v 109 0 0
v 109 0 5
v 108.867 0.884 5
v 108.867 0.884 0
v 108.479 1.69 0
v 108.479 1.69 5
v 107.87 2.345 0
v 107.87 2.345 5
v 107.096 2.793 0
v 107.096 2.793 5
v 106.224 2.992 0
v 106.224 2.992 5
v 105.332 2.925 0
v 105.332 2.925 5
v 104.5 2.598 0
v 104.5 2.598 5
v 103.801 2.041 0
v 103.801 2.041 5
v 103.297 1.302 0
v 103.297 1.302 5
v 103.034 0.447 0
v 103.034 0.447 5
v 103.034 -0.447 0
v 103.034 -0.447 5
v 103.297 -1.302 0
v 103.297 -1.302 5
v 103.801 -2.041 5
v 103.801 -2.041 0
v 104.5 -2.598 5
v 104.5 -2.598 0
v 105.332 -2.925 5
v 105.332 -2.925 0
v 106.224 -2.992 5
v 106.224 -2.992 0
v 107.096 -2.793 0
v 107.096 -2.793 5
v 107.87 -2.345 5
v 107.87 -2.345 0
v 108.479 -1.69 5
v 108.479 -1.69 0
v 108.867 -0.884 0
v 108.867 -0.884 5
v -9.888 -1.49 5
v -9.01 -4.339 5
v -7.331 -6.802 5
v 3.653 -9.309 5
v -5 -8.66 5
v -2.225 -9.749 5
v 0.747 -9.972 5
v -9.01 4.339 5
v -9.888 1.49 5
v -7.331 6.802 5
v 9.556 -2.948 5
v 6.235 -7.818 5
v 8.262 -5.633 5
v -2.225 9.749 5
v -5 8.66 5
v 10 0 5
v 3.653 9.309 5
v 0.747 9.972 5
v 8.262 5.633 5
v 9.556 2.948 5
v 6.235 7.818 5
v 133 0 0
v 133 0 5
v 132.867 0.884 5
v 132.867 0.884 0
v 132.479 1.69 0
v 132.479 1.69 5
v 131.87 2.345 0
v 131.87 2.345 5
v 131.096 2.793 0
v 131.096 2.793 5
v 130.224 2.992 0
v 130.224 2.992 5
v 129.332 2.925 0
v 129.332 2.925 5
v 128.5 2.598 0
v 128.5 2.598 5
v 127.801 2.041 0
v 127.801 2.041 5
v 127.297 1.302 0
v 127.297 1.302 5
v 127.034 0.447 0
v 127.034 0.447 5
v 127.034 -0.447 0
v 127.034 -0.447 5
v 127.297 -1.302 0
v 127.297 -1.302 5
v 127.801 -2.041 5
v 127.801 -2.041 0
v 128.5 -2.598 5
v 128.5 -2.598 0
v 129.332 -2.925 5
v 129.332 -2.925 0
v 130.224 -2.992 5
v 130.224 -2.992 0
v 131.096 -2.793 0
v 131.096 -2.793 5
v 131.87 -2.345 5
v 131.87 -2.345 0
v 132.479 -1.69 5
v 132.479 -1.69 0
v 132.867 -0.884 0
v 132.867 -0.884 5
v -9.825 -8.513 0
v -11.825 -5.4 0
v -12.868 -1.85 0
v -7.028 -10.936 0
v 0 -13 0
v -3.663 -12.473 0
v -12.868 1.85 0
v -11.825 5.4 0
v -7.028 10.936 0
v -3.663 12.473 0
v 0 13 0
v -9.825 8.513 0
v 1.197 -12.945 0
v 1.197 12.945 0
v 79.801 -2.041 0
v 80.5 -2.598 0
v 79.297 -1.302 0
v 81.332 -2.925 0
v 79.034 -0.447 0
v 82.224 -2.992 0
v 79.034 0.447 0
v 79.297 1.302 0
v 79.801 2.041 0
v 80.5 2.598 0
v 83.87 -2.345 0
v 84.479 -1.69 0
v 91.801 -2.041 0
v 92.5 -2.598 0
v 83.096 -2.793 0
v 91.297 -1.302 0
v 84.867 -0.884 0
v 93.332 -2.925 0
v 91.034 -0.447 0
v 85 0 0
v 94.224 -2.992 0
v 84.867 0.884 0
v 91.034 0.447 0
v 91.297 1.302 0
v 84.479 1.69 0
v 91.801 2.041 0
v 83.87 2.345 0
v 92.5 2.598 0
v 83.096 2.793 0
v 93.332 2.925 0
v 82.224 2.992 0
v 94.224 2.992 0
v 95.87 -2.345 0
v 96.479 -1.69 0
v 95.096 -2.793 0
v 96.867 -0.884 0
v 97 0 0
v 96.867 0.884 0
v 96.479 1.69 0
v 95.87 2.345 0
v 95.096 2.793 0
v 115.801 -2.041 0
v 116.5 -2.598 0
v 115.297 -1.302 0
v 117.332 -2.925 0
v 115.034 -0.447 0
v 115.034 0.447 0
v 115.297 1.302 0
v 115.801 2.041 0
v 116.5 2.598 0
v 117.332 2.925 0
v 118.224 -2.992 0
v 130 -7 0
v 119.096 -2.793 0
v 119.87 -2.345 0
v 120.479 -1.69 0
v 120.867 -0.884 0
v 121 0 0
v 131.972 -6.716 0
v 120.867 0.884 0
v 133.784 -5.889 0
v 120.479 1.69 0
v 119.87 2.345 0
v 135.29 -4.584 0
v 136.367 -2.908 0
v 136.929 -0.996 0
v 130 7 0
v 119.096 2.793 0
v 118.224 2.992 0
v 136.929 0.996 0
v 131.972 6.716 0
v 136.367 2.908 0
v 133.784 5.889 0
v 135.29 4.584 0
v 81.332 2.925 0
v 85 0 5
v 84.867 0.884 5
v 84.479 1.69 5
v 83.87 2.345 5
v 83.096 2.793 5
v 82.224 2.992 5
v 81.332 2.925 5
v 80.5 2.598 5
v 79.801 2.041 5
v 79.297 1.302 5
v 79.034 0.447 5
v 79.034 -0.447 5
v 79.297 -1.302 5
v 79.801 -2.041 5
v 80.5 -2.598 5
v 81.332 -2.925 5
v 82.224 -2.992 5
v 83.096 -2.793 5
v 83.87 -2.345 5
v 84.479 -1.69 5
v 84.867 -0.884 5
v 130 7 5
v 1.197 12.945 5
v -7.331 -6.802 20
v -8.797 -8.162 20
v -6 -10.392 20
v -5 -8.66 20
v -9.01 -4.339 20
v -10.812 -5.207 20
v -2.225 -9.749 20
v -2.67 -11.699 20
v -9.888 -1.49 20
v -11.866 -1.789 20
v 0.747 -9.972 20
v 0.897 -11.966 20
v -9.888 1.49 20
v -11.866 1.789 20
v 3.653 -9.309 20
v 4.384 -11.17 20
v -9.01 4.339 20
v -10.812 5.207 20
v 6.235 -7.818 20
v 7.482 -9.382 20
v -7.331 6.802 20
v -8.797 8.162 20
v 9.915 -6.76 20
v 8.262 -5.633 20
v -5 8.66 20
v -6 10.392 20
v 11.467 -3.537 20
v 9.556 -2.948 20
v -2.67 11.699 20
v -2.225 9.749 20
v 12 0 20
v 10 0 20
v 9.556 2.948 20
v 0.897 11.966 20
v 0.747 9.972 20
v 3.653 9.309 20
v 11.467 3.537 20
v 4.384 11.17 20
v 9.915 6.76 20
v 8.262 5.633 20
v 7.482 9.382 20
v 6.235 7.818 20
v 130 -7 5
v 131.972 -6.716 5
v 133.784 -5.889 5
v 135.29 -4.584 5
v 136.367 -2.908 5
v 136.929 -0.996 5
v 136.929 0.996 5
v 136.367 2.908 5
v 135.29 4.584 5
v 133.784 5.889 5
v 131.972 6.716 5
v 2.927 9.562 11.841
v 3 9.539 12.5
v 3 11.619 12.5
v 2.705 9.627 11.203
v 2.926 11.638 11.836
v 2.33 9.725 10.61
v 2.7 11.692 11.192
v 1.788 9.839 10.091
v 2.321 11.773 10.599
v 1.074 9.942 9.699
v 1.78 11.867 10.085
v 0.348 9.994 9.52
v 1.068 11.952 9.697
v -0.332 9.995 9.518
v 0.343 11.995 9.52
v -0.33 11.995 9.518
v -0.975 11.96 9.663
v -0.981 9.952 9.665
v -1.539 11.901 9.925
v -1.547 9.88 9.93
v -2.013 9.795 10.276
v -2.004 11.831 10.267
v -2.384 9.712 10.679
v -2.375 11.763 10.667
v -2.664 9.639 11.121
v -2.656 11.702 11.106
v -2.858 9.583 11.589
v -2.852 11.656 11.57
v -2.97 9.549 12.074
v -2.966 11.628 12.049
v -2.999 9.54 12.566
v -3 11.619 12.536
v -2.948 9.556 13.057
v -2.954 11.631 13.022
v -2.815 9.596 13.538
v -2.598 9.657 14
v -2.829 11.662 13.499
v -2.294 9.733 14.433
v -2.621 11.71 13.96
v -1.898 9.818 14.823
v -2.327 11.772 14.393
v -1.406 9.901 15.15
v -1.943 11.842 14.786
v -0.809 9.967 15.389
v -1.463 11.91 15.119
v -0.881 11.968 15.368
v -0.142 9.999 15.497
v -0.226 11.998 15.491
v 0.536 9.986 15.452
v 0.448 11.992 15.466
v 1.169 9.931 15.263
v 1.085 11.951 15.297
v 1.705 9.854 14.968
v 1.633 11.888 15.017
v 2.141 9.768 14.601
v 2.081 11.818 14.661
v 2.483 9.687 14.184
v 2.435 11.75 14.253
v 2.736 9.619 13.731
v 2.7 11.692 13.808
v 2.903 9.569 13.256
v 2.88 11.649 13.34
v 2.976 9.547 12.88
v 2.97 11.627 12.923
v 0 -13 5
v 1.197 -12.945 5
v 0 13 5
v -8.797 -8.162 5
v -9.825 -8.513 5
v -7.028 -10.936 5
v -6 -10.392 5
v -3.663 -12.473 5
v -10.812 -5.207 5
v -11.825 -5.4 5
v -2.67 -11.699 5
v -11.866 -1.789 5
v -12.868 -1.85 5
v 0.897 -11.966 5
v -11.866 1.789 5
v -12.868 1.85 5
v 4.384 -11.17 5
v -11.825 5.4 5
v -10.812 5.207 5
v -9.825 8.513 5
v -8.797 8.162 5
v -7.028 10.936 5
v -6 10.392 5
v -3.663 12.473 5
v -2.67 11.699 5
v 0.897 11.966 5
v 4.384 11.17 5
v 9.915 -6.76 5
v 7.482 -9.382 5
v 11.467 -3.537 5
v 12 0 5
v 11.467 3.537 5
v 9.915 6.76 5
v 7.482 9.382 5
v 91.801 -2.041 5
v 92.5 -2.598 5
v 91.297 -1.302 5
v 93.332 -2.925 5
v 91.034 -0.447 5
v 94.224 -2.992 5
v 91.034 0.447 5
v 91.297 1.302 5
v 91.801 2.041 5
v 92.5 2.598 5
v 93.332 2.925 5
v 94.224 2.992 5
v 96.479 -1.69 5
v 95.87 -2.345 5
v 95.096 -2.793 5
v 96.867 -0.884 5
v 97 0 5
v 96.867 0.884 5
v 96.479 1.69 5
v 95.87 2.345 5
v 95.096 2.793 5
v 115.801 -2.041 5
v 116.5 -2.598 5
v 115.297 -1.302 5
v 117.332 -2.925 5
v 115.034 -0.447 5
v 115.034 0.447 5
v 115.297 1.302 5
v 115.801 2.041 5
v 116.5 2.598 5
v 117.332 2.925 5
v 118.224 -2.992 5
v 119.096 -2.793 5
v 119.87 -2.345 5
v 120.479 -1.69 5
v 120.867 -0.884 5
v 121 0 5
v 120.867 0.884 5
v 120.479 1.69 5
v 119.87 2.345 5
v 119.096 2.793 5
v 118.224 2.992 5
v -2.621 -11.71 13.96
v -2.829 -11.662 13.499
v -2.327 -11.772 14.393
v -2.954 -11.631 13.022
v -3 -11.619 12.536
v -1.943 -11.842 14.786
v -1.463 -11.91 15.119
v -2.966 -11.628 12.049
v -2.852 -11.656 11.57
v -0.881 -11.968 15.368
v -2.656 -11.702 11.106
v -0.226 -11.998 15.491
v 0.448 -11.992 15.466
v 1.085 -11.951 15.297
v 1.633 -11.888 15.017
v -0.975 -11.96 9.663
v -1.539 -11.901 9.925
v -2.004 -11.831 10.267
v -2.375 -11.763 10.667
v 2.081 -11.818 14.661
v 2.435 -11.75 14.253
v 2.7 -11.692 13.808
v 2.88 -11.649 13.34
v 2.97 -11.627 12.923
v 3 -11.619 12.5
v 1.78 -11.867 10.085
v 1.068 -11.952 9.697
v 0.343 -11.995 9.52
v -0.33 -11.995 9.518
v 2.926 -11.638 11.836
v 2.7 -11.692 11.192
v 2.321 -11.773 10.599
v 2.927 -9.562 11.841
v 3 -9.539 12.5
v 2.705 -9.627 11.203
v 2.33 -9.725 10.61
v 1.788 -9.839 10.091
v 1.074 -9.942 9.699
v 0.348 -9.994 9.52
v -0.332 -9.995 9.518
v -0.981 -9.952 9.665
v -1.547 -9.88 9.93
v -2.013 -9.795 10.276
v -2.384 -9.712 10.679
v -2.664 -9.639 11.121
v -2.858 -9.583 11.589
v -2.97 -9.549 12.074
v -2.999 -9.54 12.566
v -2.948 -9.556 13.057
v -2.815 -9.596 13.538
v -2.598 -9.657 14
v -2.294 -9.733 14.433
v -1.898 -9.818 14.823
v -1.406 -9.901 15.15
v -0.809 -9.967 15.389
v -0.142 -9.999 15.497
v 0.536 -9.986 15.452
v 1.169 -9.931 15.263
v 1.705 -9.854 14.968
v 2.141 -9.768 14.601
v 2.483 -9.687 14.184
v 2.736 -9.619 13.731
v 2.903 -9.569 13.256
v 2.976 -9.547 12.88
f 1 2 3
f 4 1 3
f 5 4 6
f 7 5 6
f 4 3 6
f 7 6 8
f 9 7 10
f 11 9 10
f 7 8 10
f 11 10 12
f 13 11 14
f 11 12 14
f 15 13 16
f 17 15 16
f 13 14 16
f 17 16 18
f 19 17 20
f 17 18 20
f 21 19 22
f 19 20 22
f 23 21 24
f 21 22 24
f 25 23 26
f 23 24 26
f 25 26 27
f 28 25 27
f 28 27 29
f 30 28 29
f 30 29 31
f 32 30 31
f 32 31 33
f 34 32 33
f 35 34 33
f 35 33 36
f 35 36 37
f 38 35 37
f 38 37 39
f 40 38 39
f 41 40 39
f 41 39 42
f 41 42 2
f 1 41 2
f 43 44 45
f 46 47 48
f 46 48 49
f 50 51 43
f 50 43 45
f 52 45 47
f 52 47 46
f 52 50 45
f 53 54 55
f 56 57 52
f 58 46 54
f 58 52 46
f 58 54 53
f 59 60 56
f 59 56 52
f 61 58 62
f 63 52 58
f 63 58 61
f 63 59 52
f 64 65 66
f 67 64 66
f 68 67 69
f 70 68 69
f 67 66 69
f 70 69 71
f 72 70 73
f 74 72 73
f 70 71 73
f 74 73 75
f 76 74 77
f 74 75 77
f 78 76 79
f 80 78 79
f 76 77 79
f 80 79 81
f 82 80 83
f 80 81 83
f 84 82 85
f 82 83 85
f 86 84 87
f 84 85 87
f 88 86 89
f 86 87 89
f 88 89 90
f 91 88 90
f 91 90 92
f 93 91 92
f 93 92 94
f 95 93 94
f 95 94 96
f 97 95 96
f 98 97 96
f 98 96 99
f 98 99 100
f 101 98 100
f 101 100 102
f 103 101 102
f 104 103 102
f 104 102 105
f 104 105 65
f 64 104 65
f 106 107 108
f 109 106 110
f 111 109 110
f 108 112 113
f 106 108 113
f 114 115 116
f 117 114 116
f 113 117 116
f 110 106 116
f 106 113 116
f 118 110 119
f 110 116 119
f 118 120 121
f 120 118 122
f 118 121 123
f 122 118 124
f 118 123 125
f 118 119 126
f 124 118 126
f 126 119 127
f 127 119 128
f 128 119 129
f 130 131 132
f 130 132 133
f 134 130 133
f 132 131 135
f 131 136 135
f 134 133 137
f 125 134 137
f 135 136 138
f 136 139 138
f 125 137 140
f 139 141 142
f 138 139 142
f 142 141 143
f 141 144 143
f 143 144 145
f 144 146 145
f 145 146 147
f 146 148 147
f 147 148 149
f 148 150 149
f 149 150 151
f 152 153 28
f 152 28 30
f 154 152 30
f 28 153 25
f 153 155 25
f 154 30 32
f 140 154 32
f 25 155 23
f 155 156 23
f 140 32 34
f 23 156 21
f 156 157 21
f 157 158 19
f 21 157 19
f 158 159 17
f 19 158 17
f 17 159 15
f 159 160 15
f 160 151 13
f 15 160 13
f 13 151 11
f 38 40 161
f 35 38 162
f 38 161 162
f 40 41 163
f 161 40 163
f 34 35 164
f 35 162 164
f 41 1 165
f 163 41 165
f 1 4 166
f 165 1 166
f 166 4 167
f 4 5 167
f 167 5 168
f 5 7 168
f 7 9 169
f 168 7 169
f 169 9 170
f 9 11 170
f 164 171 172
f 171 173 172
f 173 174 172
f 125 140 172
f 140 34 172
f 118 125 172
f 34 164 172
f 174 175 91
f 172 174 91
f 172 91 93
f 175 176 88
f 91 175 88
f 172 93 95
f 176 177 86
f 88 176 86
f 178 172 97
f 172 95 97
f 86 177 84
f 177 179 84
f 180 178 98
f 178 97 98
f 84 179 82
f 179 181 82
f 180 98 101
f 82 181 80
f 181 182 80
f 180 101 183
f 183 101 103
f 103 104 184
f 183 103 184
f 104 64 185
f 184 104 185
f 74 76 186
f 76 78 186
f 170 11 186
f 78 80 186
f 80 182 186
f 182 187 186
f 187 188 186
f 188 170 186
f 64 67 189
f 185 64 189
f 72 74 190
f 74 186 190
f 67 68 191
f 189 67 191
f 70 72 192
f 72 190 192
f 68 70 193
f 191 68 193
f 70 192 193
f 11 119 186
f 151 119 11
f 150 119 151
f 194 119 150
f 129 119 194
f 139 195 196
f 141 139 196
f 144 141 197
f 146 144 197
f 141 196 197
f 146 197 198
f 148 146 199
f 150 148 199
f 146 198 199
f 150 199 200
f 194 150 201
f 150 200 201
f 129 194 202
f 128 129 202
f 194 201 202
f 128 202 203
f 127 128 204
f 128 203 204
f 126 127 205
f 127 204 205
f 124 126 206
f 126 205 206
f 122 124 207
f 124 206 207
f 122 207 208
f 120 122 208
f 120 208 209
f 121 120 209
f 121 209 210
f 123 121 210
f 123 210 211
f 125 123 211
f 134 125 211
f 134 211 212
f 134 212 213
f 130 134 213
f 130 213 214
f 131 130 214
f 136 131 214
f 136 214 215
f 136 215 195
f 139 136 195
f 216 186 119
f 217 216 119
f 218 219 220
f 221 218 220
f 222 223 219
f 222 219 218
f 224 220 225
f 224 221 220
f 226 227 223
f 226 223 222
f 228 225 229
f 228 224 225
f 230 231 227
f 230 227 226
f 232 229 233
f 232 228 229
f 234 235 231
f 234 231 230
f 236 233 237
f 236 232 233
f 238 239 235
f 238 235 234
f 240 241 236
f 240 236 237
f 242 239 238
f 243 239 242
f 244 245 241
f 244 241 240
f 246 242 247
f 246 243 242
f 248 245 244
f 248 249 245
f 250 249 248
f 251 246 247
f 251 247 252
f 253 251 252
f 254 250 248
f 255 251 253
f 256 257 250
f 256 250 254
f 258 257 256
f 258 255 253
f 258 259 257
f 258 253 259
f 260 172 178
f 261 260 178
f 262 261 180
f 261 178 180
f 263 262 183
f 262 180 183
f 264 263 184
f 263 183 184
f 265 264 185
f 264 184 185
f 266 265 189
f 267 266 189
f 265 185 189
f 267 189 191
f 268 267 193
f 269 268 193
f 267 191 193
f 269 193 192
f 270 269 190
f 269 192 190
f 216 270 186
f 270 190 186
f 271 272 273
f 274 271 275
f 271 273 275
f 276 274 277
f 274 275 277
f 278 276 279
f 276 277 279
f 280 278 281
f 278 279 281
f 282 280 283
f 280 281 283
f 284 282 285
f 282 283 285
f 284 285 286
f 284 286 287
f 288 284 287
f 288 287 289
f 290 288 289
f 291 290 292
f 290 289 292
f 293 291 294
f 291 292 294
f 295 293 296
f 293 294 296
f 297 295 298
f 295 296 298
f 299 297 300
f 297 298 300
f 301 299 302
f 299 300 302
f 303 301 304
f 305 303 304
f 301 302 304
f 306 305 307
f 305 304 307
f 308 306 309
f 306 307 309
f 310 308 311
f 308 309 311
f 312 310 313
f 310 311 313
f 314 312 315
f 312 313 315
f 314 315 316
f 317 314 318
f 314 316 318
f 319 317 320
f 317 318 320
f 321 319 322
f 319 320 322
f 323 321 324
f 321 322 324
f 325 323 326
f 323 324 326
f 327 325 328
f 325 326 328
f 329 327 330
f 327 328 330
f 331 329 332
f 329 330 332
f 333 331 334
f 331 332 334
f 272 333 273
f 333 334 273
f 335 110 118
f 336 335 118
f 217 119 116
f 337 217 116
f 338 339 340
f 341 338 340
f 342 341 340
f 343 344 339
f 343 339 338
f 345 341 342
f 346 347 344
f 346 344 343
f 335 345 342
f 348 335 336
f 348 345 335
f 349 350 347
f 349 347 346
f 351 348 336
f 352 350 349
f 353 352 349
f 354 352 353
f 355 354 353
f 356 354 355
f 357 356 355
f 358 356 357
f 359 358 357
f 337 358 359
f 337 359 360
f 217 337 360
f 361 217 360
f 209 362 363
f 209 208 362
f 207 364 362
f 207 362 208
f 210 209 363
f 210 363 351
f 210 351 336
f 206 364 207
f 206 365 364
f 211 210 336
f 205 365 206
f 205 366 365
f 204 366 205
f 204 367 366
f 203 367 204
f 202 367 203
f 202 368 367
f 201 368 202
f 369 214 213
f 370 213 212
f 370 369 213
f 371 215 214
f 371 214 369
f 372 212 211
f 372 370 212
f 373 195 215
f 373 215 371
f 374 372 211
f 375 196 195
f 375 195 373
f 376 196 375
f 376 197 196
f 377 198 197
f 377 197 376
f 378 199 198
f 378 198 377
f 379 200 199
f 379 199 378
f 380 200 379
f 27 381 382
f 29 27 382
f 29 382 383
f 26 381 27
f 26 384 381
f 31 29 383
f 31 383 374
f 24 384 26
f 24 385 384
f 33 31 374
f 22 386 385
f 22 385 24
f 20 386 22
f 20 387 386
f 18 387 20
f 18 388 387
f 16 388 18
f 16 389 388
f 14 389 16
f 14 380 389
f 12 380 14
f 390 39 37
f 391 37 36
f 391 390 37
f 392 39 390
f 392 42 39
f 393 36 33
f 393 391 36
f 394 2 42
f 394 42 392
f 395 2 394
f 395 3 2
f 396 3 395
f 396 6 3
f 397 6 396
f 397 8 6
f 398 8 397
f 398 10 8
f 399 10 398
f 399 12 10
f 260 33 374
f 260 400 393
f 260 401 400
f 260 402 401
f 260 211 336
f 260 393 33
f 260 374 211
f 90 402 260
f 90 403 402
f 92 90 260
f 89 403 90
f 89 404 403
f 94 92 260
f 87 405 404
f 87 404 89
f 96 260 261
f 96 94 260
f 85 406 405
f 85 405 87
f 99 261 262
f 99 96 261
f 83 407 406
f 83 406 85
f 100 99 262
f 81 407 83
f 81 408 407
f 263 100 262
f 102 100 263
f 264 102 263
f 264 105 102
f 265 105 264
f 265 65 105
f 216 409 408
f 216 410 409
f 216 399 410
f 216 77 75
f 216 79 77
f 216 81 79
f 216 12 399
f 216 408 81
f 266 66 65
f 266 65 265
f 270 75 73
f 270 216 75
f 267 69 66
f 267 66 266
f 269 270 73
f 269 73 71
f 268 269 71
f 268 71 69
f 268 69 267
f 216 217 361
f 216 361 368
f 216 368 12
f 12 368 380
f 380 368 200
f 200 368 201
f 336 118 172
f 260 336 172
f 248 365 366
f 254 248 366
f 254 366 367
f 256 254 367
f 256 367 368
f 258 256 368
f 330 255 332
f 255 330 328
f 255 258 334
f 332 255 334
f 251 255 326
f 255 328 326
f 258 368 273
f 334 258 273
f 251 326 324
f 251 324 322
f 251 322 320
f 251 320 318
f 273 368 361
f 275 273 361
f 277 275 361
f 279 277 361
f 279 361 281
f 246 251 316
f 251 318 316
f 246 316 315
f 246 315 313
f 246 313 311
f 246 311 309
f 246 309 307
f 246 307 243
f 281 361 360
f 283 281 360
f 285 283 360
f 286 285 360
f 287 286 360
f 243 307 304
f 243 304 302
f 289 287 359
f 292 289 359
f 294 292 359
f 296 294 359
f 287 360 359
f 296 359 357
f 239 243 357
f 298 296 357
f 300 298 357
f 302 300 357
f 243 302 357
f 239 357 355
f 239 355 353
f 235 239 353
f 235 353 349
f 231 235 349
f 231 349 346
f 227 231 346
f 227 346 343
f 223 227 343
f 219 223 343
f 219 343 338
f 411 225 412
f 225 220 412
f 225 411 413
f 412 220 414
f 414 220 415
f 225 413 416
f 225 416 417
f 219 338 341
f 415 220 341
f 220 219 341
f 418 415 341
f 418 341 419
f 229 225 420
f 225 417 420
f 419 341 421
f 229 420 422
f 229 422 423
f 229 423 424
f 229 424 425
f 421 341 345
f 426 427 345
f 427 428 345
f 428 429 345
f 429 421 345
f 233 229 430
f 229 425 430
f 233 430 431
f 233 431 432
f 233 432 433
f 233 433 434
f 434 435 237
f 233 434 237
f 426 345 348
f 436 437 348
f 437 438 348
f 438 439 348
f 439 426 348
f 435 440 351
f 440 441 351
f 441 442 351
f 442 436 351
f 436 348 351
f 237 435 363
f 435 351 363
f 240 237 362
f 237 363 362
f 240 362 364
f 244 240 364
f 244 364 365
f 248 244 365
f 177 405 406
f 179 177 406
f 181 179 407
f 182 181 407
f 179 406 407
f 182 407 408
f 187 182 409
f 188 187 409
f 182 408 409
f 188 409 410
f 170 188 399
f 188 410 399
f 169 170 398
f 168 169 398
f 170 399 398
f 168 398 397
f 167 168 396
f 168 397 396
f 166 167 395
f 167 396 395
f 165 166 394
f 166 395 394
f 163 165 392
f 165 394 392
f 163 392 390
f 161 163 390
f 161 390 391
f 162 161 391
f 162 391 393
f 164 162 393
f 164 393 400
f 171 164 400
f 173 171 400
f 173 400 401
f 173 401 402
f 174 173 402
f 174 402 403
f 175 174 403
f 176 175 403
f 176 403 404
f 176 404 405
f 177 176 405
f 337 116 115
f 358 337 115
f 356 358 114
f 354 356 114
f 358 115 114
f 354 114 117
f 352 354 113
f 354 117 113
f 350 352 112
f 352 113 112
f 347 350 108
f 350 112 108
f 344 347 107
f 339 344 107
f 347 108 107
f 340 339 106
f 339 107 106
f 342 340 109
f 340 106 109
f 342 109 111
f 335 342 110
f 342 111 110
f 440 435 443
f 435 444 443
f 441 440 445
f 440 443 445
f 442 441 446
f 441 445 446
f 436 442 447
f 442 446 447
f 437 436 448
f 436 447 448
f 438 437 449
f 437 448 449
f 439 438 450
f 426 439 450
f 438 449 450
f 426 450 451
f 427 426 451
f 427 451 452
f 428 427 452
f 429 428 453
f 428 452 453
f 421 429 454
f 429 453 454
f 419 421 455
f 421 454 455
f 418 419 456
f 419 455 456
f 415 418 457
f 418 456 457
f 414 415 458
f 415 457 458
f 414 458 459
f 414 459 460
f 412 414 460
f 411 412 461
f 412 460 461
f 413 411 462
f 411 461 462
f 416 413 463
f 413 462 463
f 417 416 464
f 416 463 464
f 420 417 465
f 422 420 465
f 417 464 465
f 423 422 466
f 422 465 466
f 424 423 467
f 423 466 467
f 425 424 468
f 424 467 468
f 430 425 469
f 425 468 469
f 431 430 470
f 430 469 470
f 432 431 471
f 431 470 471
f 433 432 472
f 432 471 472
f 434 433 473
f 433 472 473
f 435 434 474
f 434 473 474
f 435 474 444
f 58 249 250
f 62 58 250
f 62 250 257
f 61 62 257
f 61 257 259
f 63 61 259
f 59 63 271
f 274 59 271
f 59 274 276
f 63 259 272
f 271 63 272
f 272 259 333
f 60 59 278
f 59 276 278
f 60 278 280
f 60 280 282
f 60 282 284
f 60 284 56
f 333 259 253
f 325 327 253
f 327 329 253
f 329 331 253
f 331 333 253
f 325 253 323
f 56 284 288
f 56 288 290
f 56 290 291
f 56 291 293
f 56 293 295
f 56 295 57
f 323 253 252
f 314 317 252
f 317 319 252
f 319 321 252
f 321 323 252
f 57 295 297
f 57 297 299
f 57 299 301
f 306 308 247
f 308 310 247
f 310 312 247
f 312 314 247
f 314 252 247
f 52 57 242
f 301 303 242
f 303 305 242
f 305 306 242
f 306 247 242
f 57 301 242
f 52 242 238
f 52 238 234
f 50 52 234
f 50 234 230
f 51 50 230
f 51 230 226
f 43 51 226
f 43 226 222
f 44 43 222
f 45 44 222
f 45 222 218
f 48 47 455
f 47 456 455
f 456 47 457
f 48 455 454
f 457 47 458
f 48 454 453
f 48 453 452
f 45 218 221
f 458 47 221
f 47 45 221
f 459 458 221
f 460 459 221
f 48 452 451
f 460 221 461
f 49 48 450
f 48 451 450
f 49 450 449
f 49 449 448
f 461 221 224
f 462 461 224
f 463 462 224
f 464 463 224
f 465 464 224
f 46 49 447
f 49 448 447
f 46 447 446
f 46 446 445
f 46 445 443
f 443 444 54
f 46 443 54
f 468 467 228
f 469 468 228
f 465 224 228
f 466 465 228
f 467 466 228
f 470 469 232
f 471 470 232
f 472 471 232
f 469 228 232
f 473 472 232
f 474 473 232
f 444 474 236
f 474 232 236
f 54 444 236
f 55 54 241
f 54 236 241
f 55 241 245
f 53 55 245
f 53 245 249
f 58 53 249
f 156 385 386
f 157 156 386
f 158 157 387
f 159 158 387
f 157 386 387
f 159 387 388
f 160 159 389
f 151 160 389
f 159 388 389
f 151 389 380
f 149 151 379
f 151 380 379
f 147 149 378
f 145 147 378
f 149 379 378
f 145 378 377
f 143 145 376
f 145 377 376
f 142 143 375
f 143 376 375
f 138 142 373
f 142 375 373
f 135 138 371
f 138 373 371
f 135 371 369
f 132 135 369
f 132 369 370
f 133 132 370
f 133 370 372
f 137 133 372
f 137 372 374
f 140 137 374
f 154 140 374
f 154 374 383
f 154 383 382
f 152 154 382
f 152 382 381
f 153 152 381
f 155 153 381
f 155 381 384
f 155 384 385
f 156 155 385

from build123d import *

# Parameters (mm, degrees)
SZKIC2_R                    = 7
DODANIE_WYCI_GNI_CIE1_DEPTH = 5
SZKIC5_R                    = 12
DODANIE_WYCI_GNI_CIE3_DEPTH = 15
SZKIC6_R                    = 10
WYTNIJ_WYCI_GNI_CIE1_DEPTH  = 15
SZKIC7_R                    = 3
WYTNIJ_WYCI_GNI_CIE2_DEPTH  = 21.5
SZKIC8_R                    = 3
WYTNIJ_WYCI_GNI_CIE3_DEPTH  = 43


with BuildPart() as part:
    # Szkic2 → Dodanie-wyciągnięcie1 (new body)
    with BuildSketch(Plane.XY):
        with BuildLine():
            Line((130, 7), (1.197449221, 12.944733113))
            ThreePointArc((1.197449221, 12.944733113), (9.606425971, 8.75880015), (13, 0))
            ThreePointArc((13, 0), (9.606425971, -8.75880015), (1.197449221, -12.944733113))
            Line((1.197449221, -12.944733113), (130, -7))
            ThreePointArc((130, -7), (123, 0), (130, 7))
        make_face()
        with Locations((130, 0)):
            Circle(SZKIC2_R)
        with BuildLine():
            Line((1.197449221, 12.944733113), (0, 13))
            ThreePointArc((0, 13), (-13, 0), (0, -13))
            Line((0, -13), (1.197449221, -12.944733113))
            ThreePointArc((1.197449221, -12.944733113), (9.606425971, -8.75880015), (13, 0))
            ThreePointArc((13, 0), (9.606425971, 8.75880015), (1.197449221, 12.944733113))
        make_face()
    extrude(amount=DODANIE_WYCI_GNI_CIE1_DEPTH)

    # Szkic5 → Dodanie-wyciągnięcie3 (add)
    with BuildSketch(Plane.XY.offset(5)):
        Circle(SZKIC5_R)
    extrude(amount=DODANIE_WYCI_GNI_CIE3_DEPTH)

    # Szkic6 → Wytnij-wyciągnięcie1 (cut)
    with BuildSketch(Plane.XY.offset(20)):
        Circle(SZKIC6_R)
    extrude(amount=-WYTNIJ_WYCI_GNI_CIE1_DEPTH, mode=Mode.SUBTRACT)

    # Szkic7 → Wytnij-wyciągnięcie2 (cut, symmetric)
    with BuildSketch(Plane(origin=(0, 0, 0), x_dir=(1, 0, 0), z_dir=(0, 1, 0))):
        with Locations((0, -12.5)):
            Circle(SZKIC7_R)
    extrude(amount=WYTNIJ_WYCI_GNI_CIE2_DEPTH, both=True, mode=Mode.SUBTRACT)

    # Szkic8 → Wytnij-wyciągnięcie3 (cut)
    with BuildSketch(Plane.XY.offset(5)):
        with Locations((130, 0)):
            Circle(SZKIC8_R)
        with Locations((118, 0)):
            Circle(SZKIC8_R)
        with Locations((106, 0)):
            Circle(SZKIC8_R)
        with Locations((94, 0)):
            Circle(SZKIC8_R)
        with Locations((82, 0)):
            Circle(SZKIC8_R)
    extrude(amount=-WYTNIJ_WYCI_GNI_CIE3_DEPTH, mode=Mode.SUBTRACT)


solid = part.part
